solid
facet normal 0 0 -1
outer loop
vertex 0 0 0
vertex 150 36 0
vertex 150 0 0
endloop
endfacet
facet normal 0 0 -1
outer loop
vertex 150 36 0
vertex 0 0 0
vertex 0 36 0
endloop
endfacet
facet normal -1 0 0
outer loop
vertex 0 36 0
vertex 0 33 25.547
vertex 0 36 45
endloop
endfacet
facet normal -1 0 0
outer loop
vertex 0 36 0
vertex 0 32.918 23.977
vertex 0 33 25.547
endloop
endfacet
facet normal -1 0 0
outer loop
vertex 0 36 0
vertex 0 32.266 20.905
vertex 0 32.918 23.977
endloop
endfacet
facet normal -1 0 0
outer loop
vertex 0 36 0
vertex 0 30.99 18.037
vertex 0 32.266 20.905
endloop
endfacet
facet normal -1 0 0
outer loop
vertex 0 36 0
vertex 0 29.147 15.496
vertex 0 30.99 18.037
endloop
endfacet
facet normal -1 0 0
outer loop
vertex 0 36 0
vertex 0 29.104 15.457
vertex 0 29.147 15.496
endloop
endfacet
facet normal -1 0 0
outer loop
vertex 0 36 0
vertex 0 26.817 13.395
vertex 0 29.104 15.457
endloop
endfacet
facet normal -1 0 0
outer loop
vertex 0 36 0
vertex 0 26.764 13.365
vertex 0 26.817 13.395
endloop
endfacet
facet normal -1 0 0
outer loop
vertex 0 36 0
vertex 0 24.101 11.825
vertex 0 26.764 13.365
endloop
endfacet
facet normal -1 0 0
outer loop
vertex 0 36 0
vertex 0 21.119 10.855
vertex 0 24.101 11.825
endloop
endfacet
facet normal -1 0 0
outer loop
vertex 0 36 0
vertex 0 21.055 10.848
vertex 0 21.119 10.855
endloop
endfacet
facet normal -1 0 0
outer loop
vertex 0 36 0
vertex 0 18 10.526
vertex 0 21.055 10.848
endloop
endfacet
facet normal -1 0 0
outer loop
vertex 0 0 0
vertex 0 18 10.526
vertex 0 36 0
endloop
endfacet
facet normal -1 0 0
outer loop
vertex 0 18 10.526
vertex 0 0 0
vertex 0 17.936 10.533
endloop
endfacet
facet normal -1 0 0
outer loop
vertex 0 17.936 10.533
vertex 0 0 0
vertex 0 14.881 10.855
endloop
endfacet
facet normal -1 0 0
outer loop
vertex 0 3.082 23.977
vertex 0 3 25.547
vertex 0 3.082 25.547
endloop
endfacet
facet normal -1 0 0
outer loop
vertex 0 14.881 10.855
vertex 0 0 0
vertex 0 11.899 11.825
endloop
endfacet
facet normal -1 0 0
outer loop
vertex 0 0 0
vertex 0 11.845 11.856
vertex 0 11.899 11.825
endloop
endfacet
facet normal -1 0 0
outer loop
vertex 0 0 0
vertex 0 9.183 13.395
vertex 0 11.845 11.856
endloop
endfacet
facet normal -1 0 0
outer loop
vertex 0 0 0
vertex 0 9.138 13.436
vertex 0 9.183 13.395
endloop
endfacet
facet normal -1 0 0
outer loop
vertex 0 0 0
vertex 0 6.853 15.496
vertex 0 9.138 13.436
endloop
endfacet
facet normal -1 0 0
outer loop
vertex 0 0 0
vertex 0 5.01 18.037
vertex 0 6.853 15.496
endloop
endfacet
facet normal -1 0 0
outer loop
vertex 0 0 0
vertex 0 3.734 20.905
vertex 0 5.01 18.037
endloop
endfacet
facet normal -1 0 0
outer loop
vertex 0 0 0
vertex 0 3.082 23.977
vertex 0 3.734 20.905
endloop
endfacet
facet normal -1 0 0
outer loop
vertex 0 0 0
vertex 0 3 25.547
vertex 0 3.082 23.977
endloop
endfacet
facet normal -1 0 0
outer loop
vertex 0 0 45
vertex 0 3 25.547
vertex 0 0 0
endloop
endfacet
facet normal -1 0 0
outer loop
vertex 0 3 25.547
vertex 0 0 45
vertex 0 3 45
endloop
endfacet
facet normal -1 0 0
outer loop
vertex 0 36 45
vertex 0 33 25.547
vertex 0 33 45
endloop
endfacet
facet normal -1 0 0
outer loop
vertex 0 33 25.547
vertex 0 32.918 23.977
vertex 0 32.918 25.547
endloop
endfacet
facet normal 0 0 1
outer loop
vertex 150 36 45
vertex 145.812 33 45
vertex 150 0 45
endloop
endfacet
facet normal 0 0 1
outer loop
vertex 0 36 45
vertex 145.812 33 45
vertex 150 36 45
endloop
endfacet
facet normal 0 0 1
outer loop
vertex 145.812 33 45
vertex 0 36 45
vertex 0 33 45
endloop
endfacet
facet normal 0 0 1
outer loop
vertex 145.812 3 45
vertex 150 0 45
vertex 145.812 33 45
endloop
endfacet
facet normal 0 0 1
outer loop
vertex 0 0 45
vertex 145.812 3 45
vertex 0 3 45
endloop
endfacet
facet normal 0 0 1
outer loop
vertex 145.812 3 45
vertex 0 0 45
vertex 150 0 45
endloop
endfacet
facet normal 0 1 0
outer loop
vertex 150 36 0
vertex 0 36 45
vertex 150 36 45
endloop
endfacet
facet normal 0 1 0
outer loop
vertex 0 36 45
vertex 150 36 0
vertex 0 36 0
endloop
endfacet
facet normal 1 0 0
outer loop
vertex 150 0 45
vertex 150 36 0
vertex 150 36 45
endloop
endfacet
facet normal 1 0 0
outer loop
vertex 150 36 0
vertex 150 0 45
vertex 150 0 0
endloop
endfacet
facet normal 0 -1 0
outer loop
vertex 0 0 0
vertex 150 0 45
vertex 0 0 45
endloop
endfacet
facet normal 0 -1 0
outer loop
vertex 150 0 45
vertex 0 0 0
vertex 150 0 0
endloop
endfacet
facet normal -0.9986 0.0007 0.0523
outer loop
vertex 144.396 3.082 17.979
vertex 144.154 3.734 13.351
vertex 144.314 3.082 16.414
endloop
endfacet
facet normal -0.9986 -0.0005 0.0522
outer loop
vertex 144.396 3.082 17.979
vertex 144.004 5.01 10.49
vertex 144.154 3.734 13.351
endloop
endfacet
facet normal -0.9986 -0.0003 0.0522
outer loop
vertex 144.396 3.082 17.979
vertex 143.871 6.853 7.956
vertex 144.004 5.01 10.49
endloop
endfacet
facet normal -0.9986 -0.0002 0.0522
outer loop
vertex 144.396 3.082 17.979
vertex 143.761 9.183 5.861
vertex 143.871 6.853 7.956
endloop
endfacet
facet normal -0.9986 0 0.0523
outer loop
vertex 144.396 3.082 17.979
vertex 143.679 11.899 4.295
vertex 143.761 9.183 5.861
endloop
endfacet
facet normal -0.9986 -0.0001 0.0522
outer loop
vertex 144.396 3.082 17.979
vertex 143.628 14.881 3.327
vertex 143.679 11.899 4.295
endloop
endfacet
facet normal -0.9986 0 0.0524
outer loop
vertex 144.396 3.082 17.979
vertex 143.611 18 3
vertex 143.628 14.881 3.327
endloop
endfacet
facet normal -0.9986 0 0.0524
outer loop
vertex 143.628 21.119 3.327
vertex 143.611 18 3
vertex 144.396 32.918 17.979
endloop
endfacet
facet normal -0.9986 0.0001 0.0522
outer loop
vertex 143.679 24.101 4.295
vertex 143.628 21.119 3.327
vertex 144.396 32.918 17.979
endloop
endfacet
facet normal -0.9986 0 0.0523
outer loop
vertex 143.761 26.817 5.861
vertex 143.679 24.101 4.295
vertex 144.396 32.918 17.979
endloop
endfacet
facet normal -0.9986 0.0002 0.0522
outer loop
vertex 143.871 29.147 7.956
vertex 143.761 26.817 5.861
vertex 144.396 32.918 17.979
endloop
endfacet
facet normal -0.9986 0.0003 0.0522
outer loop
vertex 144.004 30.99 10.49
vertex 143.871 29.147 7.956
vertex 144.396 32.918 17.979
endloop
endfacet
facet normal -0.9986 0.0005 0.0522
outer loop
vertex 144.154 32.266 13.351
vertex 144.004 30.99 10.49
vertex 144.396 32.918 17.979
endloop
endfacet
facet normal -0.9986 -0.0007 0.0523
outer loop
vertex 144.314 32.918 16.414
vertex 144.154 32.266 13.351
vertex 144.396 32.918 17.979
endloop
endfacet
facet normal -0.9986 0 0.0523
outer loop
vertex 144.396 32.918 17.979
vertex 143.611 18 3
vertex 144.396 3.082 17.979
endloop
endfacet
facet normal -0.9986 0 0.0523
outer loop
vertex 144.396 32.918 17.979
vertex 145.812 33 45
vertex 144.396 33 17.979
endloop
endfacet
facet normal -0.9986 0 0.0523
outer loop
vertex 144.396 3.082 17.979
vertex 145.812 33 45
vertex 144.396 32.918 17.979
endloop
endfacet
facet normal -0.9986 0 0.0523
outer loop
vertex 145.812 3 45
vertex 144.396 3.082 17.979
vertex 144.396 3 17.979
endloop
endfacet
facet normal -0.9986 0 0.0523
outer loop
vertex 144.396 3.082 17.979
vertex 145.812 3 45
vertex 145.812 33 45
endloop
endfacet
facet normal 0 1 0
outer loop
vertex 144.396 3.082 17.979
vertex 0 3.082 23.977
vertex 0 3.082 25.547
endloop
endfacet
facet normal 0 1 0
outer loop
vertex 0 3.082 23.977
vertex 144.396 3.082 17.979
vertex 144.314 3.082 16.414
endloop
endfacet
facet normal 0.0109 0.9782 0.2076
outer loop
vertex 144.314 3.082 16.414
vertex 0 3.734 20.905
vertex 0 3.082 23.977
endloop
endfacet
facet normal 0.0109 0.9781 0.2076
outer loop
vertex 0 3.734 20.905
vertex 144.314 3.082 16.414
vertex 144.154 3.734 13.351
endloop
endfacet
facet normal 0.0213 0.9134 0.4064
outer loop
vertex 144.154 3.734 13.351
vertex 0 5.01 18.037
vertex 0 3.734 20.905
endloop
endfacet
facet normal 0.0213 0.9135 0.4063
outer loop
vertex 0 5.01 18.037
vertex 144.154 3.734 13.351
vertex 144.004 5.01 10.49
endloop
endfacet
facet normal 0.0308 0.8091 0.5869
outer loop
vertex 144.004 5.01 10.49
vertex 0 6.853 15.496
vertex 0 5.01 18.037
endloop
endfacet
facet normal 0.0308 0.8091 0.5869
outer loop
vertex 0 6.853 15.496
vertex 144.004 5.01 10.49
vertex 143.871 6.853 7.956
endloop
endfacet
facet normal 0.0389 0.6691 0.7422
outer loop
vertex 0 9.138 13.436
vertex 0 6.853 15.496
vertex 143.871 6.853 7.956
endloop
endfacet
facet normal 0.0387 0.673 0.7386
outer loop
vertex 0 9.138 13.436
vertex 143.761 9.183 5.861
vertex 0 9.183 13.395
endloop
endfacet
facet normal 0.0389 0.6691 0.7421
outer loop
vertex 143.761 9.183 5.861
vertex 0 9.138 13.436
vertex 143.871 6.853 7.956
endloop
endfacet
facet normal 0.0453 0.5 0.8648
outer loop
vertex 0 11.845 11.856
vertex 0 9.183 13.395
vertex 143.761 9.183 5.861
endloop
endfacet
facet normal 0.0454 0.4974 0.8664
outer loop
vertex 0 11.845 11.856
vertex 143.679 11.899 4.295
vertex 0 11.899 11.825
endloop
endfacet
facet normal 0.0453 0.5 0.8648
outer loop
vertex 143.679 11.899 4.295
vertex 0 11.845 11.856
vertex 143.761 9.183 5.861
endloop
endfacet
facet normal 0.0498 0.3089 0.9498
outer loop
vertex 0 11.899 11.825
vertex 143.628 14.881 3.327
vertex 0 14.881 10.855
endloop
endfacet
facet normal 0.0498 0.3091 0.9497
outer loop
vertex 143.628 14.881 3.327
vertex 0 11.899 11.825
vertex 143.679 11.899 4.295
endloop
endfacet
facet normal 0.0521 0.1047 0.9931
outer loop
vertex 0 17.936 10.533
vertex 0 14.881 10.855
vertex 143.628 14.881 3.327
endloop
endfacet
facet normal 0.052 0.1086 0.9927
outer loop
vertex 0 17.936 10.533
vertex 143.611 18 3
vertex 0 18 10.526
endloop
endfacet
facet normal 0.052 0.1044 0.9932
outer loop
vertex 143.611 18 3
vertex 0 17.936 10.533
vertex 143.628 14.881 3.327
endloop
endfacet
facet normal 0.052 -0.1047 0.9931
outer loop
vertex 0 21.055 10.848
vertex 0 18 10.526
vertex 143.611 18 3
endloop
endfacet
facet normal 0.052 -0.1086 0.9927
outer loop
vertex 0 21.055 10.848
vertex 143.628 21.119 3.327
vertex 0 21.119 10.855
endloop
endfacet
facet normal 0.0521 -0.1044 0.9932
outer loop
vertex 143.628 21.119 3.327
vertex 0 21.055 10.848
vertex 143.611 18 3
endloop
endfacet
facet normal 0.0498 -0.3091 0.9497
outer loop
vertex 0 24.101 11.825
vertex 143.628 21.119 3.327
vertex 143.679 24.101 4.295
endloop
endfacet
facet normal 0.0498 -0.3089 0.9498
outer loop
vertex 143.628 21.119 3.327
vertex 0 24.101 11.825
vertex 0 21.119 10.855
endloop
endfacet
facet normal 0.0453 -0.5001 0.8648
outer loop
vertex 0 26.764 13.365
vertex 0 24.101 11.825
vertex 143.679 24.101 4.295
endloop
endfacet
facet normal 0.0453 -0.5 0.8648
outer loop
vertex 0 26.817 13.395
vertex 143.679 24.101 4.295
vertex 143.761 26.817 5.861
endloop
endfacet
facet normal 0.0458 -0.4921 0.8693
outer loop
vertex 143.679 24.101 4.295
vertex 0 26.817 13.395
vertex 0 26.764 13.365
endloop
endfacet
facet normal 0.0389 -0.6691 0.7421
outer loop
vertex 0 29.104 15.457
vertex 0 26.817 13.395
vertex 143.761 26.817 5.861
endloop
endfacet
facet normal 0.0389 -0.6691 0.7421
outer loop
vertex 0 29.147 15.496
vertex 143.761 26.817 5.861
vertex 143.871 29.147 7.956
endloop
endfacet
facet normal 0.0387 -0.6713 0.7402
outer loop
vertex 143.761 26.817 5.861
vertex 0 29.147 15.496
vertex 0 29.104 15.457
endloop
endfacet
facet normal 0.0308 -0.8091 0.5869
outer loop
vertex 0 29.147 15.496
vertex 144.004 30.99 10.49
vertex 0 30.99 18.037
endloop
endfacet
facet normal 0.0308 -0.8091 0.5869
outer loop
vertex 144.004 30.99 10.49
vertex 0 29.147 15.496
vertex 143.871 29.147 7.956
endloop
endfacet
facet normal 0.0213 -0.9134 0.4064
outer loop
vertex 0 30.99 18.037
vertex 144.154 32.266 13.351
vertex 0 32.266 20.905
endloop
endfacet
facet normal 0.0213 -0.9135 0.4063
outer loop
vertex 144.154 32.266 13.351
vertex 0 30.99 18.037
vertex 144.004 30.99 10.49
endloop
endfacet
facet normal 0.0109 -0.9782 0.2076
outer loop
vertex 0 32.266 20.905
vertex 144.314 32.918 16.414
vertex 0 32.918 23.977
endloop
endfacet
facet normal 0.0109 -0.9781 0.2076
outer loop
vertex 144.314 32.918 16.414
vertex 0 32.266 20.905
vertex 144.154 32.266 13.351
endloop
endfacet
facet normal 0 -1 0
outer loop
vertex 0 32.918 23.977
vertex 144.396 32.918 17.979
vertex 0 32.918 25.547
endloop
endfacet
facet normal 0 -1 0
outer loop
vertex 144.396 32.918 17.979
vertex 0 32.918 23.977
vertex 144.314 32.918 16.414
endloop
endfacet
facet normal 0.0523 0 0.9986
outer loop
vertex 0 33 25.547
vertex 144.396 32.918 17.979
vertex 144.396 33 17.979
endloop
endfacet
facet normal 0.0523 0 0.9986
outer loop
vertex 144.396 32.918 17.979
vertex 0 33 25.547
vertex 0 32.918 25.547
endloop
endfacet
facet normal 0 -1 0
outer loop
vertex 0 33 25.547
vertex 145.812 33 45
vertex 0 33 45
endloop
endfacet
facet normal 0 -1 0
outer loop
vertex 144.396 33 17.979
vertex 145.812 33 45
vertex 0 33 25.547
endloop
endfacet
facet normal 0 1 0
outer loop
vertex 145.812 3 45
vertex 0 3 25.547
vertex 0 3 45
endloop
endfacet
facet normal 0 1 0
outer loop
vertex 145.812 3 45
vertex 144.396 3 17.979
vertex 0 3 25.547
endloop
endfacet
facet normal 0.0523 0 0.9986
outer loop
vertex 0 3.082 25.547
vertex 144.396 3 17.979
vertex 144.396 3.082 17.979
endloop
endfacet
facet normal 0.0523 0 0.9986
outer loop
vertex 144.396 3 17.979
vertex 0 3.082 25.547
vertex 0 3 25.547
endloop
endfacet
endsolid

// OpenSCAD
tubeDia=30;
thick=3;
stageHeight=45;
stageLength=150;
rotateAngle=93;

stageWidth=tubeDia+thick*2;
tubeLength=(stageLength-thick)*cos(rotateAngle-90);

gapHeight=(stageHeight-thick)/cos(rotateAngle-90)-tubeDia/2;
gapXmove=(gapHeight+tubeDia/2)*sin(rotateAngle-90);
x=(tubeDia/2)/tan(rotateAngle-90);
gapZmove=(x+tubeLength)*sin(rotateAngle-90)+thick;



difference(){
linear_extrude(stageHeight)
square([stageLength,stageWidth]);

translate([-gapXmove,stageWidth/2,gapZmove])
rotate([0,rotateAngle,0])
linear_extrude(tubeLength){
    #circle(d=tubeDia);
    translate([-gapHeight,-tubeDia/2])
        square([gapHeight,tubeDia]);

    }

}
